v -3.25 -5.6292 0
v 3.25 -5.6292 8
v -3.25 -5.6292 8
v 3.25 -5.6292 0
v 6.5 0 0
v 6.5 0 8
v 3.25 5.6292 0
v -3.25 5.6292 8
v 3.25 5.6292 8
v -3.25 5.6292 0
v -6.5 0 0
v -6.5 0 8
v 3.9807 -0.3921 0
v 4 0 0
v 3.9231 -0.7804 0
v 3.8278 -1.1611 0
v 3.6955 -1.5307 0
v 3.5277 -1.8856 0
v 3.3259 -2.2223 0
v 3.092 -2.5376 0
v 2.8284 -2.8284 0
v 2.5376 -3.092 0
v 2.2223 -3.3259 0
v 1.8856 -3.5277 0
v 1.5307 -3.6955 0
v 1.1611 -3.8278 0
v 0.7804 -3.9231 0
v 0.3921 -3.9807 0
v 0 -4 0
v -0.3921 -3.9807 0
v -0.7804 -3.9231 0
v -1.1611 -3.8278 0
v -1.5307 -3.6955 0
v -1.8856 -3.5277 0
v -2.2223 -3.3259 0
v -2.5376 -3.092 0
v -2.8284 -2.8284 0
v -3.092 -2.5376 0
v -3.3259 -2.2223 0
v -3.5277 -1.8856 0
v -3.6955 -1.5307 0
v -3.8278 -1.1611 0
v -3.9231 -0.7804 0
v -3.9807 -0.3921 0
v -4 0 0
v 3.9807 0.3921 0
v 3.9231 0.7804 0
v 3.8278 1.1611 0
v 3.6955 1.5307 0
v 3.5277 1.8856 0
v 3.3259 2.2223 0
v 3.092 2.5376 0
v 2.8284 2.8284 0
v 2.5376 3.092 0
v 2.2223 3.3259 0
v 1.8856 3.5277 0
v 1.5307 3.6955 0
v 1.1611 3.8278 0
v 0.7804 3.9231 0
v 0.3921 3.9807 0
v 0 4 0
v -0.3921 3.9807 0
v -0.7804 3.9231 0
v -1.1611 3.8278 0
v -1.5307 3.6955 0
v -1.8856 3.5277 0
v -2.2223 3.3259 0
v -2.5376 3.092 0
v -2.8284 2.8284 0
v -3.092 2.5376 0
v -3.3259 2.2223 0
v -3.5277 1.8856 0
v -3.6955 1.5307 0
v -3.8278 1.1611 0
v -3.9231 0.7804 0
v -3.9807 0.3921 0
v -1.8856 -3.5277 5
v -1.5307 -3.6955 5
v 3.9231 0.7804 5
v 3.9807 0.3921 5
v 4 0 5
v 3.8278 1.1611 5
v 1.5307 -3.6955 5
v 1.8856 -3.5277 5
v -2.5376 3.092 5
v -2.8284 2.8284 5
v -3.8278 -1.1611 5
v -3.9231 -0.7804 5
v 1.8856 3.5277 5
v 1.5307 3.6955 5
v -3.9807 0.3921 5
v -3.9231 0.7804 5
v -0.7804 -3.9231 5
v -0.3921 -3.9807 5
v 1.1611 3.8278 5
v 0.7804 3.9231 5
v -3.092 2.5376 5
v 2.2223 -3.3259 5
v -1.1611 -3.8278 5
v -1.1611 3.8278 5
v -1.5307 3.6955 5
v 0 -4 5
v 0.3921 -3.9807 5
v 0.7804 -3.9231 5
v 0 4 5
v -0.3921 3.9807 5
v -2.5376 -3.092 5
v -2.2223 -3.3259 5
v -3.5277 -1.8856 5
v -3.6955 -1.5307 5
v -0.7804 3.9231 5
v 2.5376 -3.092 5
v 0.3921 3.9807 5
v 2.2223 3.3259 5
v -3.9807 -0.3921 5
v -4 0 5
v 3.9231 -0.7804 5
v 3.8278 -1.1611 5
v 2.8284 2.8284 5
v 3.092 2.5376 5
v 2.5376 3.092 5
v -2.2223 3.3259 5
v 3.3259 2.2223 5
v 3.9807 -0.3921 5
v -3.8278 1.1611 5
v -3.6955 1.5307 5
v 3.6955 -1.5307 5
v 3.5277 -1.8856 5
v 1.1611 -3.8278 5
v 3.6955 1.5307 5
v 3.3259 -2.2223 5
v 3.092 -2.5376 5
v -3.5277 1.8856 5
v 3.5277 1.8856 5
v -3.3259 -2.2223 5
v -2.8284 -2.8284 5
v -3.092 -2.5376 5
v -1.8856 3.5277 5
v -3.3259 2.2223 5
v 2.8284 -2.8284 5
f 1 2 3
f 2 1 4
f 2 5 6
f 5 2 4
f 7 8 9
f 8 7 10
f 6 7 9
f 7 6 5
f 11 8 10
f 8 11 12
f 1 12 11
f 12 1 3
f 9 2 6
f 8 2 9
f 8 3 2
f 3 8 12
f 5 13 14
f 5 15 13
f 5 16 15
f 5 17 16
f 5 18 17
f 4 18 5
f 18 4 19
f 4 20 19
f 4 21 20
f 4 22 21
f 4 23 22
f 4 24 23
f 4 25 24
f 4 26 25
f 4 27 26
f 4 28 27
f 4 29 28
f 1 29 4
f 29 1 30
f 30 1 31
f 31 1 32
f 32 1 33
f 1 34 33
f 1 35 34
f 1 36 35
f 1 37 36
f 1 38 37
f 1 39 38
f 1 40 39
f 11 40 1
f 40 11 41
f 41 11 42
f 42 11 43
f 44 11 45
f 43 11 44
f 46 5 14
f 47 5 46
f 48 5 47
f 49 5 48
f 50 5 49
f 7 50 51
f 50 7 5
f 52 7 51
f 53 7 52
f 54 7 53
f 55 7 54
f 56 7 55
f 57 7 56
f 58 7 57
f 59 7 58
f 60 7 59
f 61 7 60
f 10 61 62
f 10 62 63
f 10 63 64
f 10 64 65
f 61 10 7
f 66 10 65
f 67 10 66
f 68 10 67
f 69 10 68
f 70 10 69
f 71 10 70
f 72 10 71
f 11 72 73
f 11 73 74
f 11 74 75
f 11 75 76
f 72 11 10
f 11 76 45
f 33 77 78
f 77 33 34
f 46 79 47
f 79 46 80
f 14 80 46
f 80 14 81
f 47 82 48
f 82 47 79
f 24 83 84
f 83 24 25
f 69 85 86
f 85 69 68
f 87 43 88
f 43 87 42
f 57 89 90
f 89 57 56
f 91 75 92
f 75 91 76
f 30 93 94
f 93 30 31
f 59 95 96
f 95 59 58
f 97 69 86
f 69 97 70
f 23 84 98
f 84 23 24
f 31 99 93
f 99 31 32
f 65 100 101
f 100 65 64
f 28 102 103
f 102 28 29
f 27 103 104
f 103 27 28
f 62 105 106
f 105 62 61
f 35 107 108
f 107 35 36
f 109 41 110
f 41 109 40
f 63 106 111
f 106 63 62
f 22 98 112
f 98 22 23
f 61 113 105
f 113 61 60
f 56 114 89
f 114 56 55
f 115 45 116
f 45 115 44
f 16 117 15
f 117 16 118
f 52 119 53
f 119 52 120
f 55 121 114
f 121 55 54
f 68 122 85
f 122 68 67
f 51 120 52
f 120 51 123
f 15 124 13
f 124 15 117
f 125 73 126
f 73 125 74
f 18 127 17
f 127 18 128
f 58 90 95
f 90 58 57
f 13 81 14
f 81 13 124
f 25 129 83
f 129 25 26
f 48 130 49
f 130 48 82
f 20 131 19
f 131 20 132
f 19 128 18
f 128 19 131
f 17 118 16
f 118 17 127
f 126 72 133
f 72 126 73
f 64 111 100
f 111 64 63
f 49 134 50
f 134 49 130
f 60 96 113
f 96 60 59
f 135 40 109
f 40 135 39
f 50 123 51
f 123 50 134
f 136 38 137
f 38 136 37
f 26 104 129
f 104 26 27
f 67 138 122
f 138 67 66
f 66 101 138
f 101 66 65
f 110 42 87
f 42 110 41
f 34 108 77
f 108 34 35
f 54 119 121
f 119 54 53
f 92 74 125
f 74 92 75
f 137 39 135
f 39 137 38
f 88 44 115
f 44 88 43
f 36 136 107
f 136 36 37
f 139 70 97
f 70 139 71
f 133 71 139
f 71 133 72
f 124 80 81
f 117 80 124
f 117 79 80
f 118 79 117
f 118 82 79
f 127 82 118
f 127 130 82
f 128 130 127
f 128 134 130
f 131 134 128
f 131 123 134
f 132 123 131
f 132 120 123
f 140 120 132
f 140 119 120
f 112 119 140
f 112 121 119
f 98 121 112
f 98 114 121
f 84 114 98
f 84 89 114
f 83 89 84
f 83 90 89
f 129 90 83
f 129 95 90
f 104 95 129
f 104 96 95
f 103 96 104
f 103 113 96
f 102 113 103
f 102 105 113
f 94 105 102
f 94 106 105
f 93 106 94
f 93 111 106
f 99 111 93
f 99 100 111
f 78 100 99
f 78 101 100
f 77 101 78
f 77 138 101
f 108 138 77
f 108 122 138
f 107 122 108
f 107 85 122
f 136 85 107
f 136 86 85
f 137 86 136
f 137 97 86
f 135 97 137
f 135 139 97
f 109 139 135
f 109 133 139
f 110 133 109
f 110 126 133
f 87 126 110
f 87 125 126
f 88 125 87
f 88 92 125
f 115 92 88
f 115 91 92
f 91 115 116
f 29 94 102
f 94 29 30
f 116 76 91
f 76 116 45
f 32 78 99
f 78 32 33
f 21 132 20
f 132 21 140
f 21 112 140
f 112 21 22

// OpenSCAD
module hex_nut() {
    difference() {
        // Hexagon shape
        scale([13.0/2, 13.0/2, 4.0/2])
            cylinder(h=4.0, r=1, $fn=6);
        // Central hole
        translate([0, 0, -1])
            cylinder(h=6.0, r=4.0, $fn=64);
    }
}

hex_nut();
